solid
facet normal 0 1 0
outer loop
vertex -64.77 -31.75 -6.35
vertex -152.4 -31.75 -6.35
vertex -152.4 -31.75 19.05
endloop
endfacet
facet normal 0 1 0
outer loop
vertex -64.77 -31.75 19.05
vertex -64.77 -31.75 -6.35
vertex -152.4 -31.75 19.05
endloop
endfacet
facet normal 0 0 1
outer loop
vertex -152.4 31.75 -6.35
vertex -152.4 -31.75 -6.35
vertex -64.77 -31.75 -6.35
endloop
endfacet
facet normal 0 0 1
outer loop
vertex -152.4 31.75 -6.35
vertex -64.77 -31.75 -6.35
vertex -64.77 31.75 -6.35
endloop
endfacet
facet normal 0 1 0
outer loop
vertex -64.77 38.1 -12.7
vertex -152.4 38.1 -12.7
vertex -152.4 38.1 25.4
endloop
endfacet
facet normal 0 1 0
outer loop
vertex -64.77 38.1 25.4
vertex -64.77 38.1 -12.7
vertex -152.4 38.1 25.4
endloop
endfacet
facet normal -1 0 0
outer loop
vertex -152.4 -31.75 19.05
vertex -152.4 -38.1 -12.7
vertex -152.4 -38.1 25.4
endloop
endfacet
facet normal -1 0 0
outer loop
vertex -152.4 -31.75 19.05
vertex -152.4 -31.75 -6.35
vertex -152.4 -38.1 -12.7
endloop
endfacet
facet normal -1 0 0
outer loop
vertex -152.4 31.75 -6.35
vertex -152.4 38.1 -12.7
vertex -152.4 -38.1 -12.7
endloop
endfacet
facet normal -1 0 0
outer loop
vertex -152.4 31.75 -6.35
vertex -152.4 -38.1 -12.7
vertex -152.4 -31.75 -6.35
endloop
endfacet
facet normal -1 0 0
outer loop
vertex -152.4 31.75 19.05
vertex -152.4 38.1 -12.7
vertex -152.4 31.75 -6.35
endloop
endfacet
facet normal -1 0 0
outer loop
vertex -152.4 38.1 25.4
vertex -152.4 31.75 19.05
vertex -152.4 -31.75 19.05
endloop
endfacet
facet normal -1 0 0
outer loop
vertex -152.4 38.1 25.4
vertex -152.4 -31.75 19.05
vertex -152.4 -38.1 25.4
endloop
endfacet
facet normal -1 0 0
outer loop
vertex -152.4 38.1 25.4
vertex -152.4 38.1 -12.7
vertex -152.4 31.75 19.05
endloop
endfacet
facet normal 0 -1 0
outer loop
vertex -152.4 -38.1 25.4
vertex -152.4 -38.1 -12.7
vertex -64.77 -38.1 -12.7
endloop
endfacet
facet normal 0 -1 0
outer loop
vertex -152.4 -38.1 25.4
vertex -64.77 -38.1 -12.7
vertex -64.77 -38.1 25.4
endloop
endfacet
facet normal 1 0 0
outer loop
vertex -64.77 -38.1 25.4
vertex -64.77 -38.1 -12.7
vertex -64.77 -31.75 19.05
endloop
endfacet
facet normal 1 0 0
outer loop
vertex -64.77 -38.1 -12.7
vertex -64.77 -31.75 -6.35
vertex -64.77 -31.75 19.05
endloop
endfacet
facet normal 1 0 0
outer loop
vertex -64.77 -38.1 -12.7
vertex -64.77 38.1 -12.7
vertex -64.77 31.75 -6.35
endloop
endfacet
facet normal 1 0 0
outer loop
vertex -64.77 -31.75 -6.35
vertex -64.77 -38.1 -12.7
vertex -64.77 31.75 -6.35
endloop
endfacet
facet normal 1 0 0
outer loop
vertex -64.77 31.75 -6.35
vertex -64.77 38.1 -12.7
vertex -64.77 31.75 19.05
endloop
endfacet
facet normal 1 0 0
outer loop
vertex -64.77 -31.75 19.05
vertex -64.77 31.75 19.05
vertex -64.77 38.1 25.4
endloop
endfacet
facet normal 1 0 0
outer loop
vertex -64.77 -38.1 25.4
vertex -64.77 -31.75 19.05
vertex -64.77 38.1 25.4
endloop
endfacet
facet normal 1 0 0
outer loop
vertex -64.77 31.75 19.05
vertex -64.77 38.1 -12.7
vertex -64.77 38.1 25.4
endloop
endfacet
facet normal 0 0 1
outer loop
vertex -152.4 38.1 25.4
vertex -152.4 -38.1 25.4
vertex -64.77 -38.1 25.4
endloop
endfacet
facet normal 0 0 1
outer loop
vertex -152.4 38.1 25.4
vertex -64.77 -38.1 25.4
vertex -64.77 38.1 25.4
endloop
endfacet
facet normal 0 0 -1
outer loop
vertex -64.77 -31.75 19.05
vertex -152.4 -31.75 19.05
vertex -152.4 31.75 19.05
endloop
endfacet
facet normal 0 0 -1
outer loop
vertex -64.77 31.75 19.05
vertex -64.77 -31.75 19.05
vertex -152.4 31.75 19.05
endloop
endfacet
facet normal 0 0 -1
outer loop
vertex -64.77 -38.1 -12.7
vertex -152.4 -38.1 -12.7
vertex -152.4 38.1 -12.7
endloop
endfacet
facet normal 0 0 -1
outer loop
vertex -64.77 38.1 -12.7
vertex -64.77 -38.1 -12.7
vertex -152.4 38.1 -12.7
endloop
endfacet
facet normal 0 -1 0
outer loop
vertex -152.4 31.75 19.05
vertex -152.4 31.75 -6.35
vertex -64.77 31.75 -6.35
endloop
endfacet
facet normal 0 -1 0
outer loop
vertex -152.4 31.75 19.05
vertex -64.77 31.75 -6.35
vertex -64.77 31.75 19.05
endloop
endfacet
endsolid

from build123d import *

# Parameters (mm, degrees)
SKETCH4_W           = 38.1
SKETCH4_H           = 76.2
SKETCH4_W_2         = 25.4
SKETCH4_H_2         = 63.5
BOSS_EXTRUDE1_DEPTH = 87.63


with BuildPart() as part:
    # Sketch4 → Boss-Extrude1 (new body)
    with BuildSketch(Plane.ZY.offset(152.4)):
        with Locations((6.35, 0)):
            Rectangle(SKETCH4_W, SKETCH4_H)
        with Locations((6.35, 0)):
            Rectangle(SKETCH4_W_2, SKETCH4_H_2, mode=Mode.SUBTRACT)
    extrude(amount=-BOSS_EXTRUDE1_DEPTH)


solid = part.part
